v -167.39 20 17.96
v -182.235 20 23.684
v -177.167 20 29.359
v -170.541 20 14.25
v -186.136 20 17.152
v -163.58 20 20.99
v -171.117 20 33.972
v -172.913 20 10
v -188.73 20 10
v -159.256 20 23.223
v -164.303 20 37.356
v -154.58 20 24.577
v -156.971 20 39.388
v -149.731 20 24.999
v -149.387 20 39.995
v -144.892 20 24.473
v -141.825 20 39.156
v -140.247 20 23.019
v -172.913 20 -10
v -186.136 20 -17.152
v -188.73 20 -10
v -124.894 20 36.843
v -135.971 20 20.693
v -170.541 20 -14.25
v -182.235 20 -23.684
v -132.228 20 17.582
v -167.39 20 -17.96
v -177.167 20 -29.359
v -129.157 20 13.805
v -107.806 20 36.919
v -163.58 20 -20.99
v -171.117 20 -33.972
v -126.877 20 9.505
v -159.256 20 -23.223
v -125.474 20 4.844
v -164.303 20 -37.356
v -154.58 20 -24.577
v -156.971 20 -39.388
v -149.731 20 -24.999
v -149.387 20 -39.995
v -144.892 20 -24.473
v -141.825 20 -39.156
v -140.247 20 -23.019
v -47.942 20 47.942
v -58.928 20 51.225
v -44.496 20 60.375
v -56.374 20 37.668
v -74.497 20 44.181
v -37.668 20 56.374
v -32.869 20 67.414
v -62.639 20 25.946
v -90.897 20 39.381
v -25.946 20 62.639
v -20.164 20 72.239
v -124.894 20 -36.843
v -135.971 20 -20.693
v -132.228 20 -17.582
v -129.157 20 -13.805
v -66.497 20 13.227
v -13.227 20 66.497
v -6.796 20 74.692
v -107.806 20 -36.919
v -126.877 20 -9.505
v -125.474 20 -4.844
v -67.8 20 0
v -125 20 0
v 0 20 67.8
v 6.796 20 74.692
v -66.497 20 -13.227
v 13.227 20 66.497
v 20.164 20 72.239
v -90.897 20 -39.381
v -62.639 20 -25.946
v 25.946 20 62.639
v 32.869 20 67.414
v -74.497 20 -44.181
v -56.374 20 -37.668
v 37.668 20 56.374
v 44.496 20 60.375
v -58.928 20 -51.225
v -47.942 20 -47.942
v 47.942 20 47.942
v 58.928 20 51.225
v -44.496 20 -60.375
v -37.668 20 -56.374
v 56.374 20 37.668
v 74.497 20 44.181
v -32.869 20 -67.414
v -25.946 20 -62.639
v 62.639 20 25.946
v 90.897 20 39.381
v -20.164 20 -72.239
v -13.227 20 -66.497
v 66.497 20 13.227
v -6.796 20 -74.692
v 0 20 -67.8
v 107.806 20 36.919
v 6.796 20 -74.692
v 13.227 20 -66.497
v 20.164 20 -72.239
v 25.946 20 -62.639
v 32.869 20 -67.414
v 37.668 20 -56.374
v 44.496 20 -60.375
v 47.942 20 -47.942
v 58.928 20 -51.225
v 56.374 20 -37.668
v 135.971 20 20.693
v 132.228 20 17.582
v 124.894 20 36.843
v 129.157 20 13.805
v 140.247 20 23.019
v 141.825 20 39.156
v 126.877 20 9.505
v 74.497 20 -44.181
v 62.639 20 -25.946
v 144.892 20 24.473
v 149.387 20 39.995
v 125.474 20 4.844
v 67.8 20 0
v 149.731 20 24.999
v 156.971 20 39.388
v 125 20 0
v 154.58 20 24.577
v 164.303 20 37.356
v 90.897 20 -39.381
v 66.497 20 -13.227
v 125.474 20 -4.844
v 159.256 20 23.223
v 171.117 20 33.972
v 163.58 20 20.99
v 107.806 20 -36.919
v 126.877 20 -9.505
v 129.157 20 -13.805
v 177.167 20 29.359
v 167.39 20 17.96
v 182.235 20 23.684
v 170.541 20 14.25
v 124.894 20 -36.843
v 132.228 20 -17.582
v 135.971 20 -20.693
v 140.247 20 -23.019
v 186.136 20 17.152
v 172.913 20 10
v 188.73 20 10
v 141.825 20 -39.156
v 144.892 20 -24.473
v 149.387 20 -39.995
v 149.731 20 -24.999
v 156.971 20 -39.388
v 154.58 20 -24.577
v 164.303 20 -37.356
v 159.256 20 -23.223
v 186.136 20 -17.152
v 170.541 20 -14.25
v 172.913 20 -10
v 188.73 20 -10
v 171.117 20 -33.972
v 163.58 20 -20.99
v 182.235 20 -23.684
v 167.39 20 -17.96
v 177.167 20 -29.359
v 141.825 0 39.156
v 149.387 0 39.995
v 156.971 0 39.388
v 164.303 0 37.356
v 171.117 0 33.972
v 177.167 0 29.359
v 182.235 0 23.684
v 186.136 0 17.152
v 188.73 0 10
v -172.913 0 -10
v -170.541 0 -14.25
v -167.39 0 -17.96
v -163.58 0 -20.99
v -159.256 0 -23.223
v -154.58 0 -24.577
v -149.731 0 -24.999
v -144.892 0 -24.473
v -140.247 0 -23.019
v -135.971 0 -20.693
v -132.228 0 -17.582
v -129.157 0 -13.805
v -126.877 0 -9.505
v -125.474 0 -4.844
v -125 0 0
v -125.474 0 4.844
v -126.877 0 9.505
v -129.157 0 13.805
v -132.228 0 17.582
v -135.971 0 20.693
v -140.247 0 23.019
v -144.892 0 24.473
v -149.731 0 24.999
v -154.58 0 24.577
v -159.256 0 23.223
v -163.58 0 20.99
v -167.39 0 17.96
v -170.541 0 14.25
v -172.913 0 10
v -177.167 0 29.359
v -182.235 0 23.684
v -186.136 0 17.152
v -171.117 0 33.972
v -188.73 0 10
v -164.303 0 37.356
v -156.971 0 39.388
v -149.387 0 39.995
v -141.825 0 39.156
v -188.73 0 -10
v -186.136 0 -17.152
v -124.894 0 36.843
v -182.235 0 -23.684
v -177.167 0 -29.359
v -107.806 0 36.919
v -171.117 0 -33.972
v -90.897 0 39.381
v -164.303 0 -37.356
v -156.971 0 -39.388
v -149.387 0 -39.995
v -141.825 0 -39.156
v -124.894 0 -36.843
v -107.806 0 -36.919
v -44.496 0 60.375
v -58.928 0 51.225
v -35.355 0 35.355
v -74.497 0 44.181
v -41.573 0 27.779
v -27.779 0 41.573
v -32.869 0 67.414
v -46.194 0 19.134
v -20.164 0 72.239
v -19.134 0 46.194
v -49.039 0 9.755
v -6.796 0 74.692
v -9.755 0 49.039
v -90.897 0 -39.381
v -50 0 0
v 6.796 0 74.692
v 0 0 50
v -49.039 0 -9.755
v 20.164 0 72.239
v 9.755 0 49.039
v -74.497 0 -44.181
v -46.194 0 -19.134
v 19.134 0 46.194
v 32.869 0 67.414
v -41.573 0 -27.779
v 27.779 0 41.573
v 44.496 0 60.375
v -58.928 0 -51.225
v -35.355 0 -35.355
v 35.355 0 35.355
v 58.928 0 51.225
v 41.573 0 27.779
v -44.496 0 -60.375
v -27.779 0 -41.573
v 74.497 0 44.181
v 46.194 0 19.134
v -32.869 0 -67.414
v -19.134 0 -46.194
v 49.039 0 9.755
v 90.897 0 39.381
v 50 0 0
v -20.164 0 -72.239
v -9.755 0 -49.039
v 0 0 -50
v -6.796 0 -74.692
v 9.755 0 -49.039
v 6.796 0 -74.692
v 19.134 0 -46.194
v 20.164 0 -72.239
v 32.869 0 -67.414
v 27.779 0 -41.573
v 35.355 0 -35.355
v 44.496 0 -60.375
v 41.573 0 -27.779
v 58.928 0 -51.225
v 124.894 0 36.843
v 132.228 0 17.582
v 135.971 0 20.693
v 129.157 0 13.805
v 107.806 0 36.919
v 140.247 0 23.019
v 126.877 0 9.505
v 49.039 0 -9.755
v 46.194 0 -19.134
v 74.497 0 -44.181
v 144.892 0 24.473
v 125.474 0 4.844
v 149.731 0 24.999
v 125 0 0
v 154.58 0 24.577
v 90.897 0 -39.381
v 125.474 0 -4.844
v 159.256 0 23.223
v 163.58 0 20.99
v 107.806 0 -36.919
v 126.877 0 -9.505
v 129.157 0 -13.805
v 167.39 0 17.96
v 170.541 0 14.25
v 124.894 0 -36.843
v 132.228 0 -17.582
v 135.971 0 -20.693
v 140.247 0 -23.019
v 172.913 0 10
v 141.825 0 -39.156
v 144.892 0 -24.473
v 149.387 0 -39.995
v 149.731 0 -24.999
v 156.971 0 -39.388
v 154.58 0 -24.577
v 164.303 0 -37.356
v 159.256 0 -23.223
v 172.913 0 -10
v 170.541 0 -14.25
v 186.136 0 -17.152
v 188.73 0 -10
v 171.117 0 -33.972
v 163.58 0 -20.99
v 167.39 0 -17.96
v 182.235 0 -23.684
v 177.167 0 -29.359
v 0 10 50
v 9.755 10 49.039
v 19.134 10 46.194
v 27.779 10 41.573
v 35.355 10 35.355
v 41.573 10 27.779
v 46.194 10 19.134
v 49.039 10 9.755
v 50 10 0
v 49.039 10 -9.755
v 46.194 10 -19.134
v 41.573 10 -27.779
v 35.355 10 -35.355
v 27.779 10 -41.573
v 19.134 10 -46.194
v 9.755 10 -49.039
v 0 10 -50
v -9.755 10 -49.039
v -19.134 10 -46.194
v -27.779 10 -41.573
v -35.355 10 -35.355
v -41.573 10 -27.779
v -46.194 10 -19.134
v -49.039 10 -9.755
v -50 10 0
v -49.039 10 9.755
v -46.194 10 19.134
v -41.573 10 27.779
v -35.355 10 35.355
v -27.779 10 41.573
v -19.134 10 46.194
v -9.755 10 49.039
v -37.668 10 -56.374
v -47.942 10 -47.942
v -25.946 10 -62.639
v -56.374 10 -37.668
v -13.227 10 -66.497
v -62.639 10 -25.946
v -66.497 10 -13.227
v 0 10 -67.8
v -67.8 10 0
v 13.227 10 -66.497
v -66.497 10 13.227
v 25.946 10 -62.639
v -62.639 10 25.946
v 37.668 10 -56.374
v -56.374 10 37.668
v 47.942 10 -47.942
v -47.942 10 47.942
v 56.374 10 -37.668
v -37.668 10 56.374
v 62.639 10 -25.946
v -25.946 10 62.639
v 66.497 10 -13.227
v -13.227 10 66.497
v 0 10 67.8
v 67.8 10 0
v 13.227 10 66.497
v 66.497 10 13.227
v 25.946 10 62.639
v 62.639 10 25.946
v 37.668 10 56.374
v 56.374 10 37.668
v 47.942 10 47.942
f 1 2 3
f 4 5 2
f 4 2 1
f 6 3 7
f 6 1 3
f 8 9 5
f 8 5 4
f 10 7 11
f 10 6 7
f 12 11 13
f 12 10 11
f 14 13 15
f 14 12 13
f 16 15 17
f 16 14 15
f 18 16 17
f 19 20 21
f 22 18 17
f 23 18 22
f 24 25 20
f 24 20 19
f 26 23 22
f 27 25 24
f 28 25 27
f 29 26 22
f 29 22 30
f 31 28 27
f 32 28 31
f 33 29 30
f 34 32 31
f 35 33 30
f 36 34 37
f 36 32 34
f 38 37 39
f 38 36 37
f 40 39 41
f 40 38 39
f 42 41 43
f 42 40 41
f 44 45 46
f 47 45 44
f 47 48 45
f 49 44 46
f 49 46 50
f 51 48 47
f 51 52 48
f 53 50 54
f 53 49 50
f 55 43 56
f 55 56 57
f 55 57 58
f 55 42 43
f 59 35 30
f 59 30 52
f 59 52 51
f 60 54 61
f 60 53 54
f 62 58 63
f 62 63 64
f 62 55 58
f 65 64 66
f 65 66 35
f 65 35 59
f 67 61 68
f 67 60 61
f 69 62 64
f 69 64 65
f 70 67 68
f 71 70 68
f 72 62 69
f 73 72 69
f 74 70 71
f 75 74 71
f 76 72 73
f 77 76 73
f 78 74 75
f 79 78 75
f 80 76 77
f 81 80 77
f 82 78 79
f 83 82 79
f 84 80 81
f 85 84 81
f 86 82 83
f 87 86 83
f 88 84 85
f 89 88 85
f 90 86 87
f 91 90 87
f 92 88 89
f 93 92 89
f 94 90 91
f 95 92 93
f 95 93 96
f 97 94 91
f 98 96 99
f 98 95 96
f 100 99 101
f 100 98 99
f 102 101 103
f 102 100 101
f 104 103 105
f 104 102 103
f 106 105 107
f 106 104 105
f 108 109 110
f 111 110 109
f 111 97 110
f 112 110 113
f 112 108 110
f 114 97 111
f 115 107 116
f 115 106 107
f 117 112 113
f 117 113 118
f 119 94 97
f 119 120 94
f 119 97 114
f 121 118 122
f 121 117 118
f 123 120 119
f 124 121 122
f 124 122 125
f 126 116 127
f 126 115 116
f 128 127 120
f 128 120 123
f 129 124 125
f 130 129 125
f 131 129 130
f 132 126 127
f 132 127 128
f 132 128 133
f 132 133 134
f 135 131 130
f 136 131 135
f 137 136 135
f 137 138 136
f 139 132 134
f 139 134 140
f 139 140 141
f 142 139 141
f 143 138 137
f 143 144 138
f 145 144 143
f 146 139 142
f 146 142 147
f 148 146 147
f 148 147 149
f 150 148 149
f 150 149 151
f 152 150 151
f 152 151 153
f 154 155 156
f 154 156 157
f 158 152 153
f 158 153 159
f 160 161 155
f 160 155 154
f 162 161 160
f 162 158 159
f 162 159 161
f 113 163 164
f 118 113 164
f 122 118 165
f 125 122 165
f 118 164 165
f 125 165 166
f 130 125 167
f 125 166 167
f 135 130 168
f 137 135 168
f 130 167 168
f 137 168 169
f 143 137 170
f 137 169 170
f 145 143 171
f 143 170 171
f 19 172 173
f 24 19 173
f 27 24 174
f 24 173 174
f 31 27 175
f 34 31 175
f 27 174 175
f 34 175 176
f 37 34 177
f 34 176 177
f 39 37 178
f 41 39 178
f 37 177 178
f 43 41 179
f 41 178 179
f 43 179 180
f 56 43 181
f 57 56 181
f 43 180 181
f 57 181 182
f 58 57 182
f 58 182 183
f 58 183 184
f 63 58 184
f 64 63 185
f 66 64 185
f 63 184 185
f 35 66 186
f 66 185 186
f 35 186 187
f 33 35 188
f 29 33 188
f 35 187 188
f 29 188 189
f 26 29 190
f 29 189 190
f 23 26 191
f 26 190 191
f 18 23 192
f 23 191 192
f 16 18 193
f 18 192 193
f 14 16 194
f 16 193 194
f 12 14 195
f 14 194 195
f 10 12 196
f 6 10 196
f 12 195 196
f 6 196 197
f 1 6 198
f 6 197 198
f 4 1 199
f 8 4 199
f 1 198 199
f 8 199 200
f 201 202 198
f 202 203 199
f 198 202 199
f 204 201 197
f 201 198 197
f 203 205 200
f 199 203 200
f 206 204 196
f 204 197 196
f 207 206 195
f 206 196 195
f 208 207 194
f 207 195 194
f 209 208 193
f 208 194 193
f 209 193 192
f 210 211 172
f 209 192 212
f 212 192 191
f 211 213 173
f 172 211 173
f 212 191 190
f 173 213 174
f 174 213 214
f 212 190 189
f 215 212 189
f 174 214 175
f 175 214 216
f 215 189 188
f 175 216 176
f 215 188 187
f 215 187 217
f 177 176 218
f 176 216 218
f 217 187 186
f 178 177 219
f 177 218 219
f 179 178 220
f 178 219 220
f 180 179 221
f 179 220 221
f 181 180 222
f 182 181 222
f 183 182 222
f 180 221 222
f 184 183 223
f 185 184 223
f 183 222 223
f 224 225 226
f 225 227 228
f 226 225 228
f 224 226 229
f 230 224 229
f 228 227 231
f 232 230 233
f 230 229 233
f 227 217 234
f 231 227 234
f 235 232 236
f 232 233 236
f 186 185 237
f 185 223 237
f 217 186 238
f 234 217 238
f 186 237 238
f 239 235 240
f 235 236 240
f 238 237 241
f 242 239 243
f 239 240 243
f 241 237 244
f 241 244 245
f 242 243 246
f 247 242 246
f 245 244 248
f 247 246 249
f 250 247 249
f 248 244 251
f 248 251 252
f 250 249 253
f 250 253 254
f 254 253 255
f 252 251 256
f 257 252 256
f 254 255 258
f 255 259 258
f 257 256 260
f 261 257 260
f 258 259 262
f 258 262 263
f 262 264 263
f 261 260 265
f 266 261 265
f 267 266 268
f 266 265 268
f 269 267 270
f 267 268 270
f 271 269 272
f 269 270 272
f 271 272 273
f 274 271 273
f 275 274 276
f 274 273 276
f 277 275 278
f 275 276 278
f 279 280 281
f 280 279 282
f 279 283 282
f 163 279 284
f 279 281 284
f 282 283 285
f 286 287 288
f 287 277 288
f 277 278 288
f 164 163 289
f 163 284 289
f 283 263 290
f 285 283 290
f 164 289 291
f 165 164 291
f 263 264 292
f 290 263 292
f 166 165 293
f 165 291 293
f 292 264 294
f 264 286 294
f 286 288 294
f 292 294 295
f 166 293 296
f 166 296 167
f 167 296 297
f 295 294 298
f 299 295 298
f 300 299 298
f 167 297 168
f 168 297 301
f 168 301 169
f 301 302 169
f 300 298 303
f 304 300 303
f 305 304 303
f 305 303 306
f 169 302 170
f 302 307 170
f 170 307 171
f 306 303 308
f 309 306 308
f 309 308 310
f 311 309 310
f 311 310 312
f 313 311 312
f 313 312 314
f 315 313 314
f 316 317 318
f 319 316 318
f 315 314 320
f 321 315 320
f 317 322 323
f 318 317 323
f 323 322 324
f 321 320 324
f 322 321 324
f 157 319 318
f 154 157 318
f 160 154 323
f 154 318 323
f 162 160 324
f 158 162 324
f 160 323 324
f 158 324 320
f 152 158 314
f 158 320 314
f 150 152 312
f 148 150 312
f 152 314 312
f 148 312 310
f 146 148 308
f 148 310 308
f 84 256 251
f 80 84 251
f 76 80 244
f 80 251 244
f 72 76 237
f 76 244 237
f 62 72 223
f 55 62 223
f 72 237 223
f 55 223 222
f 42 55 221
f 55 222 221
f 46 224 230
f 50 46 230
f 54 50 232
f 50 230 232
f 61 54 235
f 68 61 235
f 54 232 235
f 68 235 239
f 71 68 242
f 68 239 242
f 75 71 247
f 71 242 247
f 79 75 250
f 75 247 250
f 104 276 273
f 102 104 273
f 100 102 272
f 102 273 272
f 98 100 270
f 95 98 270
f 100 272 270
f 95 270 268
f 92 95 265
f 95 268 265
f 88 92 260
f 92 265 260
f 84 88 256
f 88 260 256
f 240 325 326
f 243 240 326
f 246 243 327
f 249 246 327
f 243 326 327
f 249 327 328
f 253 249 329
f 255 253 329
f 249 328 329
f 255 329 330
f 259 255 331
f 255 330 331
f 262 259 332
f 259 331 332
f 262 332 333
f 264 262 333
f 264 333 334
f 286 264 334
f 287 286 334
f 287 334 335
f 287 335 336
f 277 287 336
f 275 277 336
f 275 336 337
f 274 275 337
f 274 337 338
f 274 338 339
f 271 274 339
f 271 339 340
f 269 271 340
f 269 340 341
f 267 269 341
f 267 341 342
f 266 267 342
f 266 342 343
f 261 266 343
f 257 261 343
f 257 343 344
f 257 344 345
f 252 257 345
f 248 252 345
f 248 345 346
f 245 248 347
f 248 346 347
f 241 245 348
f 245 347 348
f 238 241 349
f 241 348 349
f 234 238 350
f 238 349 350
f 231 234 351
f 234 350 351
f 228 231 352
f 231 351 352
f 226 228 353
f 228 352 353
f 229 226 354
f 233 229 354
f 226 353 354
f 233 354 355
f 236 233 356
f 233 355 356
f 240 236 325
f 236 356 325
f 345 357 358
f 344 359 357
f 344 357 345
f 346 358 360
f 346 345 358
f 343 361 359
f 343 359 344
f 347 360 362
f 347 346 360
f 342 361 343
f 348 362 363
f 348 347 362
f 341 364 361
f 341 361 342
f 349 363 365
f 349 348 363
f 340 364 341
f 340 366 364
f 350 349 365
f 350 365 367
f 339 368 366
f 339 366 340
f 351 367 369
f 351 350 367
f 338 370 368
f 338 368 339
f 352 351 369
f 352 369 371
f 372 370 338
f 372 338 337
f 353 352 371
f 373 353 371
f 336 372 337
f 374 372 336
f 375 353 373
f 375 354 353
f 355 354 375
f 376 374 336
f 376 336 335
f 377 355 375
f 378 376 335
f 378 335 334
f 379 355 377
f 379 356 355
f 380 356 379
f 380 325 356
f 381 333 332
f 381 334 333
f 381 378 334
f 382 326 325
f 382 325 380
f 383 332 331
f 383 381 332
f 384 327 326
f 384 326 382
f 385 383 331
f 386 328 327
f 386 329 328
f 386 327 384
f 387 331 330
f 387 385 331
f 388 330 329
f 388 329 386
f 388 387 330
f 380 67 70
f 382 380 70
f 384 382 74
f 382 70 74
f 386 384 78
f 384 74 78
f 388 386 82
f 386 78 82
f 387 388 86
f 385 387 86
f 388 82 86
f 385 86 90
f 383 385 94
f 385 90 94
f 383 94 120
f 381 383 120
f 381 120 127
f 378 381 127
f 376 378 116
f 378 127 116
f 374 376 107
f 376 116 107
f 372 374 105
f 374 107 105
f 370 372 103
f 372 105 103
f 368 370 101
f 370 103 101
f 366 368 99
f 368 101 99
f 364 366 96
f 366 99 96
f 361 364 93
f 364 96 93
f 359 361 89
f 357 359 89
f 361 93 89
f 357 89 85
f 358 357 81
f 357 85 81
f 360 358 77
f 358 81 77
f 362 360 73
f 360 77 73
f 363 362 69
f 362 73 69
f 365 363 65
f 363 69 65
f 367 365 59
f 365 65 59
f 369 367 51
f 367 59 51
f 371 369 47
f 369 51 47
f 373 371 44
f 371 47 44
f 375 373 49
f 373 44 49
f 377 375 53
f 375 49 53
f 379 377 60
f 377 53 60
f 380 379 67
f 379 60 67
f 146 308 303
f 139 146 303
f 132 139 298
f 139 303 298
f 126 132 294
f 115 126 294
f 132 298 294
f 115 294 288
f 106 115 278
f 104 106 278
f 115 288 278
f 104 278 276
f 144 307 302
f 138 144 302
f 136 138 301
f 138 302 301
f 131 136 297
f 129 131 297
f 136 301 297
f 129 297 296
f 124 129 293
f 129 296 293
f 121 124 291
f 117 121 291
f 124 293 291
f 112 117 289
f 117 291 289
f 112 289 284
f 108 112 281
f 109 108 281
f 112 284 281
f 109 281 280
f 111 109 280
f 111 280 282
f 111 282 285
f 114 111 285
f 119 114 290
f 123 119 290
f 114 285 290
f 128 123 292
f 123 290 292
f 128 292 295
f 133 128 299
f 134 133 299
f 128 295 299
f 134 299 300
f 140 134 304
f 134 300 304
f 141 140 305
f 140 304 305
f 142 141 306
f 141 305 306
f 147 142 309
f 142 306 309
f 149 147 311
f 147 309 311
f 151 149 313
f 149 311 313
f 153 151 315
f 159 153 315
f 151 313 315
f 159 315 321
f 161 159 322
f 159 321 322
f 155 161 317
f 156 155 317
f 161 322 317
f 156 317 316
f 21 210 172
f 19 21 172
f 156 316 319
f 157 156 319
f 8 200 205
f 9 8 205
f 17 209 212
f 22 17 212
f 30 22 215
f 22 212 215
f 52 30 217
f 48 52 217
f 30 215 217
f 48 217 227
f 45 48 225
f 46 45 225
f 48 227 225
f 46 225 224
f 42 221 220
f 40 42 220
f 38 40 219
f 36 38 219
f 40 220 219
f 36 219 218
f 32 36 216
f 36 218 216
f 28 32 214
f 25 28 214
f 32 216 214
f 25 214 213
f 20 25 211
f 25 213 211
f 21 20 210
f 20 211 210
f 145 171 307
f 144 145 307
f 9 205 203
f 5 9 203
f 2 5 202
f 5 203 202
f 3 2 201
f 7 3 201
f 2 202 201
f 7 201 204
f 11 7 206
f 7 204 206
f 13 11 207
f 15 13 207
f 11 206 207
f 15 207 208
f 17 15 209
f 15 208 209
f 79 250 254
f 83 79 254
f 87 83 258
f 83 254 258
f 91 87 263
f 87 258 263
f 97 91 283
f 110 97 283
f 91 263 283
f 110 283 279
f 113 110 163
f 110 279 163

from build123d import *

# Parameters (mm, degrees)
Y_KSEKLIK_EKSTR_ZYON4_DEPTH = 20
IZIM5_R                     = 67.8
IZIM5_R_2                   = 50
KES_EKSTR_ZYON1_DEPTH       = 10
IZIM7_R                     = 50
KES_EKSTR_ZYON2_DEPTH       = 20


with BuildPart() as part:
    # Çizim1 → Yükseklik-Ekstrüzyon4 (new body)
    with BuildSketch(Plane(origin=(0, 0, 0), x_dir=(1, 0, 0), z_dir=(0, 1, 0))):
        with BuildLine():
            ThreePointArc((-141.825379968, 39.155786128), (-171.116823462, 33.971749541), (-188.729833462, 10))
            Line((-188.729833462, 10), (-172.912878475, 10))
            ThreePointArc((-172.912878475, 10), (-125, 0), (-172.912878475, -10))
            Line((-172.912878475, -10), (-188.729833462, -10))
            ThreePointArc((-188.729833462, -10), (-171.116823462, -33.971749541), (-141.825379968, -39.155786128))
            ThreePointArc((-141.825379968, -39.155786128), (-90.896626459, -39.380855183), (-44.495770634, -60.374882159))
            ThreePointArc((-44.495770634, -60.374882159), (0, -75), (44.495770634, -60.374882159))
            ThreePointArc((44.495770634, -60.374882159), (90.896626459, -39.380855183), (141.825379968, -39.155786128))
            ThreePointArc((141.825379968, -39.155786128), (171.116823462, -33.971749541), (188.729833462, -10))
            Line((188.729833462, -10), (172.912878475, -10))
            ThreePointArc((172.912878475, -10), (125, 0), (172.912878475, 10))
            Line((172.912878475, 10), (188.729833462, 10))
            ThreePointArc((188.729833462, 10), (171.116823462, 33.971749541), (141.825379968, 39.155786128))
            ThreePointArc((141.825379968, 39.155786128), (90.896626459, 39.380855183), (44.495770634, 60.374882159))
            ThreePointArc((44.495770634, 60.374882159), (0, 75), (-44.495770634, 60.374882159))
            ThreePointArc((-44.495770634, 60.374882159), (-90.896626459, 39.380855183), (-141.825379968, 39.155786128))
        make_face()
    extrude(amount=Y_KSEKLIK_EKSTR_ZYON4_DEPTH)

    # Çizim5 → Kes-Ekstrüzyon1 (cut)
    with BuildSketch(Plane(origin=(0, 20, 0), x_dir=(1, 0, 0), z_dir=(0, 1, 0))):
        with Locations(Location((0, 0, 0), (0, 0, 270))):
            Circle(IZIM5_R)
        with Locations(Location((0, 0, 0), (0, 0, 270))):
            Circle(IZIM5_R_2, mode=Mode.SUBTRACT)
    extrude(amount=-KES_EKSTR_ZYON1_DEPTH, mode=Mode.SUBTRACT)

    # Çizim7 → Kes-Ekstrüzyon2 (cut)
    with BuildSketch(Plane(origin=(0, 20, 0), x_dir=(1, 0, 0), z_dir=(0, 1, 0))):
        with Locations(Location((0, 0, 0), (0, 0, 270))):
            Circle(IZIM7_R)
    extrude(amount=-KES_EKSTR_ZYON2_DEPTH, mode=Mode.SUBTRACT)


solid = part.part
